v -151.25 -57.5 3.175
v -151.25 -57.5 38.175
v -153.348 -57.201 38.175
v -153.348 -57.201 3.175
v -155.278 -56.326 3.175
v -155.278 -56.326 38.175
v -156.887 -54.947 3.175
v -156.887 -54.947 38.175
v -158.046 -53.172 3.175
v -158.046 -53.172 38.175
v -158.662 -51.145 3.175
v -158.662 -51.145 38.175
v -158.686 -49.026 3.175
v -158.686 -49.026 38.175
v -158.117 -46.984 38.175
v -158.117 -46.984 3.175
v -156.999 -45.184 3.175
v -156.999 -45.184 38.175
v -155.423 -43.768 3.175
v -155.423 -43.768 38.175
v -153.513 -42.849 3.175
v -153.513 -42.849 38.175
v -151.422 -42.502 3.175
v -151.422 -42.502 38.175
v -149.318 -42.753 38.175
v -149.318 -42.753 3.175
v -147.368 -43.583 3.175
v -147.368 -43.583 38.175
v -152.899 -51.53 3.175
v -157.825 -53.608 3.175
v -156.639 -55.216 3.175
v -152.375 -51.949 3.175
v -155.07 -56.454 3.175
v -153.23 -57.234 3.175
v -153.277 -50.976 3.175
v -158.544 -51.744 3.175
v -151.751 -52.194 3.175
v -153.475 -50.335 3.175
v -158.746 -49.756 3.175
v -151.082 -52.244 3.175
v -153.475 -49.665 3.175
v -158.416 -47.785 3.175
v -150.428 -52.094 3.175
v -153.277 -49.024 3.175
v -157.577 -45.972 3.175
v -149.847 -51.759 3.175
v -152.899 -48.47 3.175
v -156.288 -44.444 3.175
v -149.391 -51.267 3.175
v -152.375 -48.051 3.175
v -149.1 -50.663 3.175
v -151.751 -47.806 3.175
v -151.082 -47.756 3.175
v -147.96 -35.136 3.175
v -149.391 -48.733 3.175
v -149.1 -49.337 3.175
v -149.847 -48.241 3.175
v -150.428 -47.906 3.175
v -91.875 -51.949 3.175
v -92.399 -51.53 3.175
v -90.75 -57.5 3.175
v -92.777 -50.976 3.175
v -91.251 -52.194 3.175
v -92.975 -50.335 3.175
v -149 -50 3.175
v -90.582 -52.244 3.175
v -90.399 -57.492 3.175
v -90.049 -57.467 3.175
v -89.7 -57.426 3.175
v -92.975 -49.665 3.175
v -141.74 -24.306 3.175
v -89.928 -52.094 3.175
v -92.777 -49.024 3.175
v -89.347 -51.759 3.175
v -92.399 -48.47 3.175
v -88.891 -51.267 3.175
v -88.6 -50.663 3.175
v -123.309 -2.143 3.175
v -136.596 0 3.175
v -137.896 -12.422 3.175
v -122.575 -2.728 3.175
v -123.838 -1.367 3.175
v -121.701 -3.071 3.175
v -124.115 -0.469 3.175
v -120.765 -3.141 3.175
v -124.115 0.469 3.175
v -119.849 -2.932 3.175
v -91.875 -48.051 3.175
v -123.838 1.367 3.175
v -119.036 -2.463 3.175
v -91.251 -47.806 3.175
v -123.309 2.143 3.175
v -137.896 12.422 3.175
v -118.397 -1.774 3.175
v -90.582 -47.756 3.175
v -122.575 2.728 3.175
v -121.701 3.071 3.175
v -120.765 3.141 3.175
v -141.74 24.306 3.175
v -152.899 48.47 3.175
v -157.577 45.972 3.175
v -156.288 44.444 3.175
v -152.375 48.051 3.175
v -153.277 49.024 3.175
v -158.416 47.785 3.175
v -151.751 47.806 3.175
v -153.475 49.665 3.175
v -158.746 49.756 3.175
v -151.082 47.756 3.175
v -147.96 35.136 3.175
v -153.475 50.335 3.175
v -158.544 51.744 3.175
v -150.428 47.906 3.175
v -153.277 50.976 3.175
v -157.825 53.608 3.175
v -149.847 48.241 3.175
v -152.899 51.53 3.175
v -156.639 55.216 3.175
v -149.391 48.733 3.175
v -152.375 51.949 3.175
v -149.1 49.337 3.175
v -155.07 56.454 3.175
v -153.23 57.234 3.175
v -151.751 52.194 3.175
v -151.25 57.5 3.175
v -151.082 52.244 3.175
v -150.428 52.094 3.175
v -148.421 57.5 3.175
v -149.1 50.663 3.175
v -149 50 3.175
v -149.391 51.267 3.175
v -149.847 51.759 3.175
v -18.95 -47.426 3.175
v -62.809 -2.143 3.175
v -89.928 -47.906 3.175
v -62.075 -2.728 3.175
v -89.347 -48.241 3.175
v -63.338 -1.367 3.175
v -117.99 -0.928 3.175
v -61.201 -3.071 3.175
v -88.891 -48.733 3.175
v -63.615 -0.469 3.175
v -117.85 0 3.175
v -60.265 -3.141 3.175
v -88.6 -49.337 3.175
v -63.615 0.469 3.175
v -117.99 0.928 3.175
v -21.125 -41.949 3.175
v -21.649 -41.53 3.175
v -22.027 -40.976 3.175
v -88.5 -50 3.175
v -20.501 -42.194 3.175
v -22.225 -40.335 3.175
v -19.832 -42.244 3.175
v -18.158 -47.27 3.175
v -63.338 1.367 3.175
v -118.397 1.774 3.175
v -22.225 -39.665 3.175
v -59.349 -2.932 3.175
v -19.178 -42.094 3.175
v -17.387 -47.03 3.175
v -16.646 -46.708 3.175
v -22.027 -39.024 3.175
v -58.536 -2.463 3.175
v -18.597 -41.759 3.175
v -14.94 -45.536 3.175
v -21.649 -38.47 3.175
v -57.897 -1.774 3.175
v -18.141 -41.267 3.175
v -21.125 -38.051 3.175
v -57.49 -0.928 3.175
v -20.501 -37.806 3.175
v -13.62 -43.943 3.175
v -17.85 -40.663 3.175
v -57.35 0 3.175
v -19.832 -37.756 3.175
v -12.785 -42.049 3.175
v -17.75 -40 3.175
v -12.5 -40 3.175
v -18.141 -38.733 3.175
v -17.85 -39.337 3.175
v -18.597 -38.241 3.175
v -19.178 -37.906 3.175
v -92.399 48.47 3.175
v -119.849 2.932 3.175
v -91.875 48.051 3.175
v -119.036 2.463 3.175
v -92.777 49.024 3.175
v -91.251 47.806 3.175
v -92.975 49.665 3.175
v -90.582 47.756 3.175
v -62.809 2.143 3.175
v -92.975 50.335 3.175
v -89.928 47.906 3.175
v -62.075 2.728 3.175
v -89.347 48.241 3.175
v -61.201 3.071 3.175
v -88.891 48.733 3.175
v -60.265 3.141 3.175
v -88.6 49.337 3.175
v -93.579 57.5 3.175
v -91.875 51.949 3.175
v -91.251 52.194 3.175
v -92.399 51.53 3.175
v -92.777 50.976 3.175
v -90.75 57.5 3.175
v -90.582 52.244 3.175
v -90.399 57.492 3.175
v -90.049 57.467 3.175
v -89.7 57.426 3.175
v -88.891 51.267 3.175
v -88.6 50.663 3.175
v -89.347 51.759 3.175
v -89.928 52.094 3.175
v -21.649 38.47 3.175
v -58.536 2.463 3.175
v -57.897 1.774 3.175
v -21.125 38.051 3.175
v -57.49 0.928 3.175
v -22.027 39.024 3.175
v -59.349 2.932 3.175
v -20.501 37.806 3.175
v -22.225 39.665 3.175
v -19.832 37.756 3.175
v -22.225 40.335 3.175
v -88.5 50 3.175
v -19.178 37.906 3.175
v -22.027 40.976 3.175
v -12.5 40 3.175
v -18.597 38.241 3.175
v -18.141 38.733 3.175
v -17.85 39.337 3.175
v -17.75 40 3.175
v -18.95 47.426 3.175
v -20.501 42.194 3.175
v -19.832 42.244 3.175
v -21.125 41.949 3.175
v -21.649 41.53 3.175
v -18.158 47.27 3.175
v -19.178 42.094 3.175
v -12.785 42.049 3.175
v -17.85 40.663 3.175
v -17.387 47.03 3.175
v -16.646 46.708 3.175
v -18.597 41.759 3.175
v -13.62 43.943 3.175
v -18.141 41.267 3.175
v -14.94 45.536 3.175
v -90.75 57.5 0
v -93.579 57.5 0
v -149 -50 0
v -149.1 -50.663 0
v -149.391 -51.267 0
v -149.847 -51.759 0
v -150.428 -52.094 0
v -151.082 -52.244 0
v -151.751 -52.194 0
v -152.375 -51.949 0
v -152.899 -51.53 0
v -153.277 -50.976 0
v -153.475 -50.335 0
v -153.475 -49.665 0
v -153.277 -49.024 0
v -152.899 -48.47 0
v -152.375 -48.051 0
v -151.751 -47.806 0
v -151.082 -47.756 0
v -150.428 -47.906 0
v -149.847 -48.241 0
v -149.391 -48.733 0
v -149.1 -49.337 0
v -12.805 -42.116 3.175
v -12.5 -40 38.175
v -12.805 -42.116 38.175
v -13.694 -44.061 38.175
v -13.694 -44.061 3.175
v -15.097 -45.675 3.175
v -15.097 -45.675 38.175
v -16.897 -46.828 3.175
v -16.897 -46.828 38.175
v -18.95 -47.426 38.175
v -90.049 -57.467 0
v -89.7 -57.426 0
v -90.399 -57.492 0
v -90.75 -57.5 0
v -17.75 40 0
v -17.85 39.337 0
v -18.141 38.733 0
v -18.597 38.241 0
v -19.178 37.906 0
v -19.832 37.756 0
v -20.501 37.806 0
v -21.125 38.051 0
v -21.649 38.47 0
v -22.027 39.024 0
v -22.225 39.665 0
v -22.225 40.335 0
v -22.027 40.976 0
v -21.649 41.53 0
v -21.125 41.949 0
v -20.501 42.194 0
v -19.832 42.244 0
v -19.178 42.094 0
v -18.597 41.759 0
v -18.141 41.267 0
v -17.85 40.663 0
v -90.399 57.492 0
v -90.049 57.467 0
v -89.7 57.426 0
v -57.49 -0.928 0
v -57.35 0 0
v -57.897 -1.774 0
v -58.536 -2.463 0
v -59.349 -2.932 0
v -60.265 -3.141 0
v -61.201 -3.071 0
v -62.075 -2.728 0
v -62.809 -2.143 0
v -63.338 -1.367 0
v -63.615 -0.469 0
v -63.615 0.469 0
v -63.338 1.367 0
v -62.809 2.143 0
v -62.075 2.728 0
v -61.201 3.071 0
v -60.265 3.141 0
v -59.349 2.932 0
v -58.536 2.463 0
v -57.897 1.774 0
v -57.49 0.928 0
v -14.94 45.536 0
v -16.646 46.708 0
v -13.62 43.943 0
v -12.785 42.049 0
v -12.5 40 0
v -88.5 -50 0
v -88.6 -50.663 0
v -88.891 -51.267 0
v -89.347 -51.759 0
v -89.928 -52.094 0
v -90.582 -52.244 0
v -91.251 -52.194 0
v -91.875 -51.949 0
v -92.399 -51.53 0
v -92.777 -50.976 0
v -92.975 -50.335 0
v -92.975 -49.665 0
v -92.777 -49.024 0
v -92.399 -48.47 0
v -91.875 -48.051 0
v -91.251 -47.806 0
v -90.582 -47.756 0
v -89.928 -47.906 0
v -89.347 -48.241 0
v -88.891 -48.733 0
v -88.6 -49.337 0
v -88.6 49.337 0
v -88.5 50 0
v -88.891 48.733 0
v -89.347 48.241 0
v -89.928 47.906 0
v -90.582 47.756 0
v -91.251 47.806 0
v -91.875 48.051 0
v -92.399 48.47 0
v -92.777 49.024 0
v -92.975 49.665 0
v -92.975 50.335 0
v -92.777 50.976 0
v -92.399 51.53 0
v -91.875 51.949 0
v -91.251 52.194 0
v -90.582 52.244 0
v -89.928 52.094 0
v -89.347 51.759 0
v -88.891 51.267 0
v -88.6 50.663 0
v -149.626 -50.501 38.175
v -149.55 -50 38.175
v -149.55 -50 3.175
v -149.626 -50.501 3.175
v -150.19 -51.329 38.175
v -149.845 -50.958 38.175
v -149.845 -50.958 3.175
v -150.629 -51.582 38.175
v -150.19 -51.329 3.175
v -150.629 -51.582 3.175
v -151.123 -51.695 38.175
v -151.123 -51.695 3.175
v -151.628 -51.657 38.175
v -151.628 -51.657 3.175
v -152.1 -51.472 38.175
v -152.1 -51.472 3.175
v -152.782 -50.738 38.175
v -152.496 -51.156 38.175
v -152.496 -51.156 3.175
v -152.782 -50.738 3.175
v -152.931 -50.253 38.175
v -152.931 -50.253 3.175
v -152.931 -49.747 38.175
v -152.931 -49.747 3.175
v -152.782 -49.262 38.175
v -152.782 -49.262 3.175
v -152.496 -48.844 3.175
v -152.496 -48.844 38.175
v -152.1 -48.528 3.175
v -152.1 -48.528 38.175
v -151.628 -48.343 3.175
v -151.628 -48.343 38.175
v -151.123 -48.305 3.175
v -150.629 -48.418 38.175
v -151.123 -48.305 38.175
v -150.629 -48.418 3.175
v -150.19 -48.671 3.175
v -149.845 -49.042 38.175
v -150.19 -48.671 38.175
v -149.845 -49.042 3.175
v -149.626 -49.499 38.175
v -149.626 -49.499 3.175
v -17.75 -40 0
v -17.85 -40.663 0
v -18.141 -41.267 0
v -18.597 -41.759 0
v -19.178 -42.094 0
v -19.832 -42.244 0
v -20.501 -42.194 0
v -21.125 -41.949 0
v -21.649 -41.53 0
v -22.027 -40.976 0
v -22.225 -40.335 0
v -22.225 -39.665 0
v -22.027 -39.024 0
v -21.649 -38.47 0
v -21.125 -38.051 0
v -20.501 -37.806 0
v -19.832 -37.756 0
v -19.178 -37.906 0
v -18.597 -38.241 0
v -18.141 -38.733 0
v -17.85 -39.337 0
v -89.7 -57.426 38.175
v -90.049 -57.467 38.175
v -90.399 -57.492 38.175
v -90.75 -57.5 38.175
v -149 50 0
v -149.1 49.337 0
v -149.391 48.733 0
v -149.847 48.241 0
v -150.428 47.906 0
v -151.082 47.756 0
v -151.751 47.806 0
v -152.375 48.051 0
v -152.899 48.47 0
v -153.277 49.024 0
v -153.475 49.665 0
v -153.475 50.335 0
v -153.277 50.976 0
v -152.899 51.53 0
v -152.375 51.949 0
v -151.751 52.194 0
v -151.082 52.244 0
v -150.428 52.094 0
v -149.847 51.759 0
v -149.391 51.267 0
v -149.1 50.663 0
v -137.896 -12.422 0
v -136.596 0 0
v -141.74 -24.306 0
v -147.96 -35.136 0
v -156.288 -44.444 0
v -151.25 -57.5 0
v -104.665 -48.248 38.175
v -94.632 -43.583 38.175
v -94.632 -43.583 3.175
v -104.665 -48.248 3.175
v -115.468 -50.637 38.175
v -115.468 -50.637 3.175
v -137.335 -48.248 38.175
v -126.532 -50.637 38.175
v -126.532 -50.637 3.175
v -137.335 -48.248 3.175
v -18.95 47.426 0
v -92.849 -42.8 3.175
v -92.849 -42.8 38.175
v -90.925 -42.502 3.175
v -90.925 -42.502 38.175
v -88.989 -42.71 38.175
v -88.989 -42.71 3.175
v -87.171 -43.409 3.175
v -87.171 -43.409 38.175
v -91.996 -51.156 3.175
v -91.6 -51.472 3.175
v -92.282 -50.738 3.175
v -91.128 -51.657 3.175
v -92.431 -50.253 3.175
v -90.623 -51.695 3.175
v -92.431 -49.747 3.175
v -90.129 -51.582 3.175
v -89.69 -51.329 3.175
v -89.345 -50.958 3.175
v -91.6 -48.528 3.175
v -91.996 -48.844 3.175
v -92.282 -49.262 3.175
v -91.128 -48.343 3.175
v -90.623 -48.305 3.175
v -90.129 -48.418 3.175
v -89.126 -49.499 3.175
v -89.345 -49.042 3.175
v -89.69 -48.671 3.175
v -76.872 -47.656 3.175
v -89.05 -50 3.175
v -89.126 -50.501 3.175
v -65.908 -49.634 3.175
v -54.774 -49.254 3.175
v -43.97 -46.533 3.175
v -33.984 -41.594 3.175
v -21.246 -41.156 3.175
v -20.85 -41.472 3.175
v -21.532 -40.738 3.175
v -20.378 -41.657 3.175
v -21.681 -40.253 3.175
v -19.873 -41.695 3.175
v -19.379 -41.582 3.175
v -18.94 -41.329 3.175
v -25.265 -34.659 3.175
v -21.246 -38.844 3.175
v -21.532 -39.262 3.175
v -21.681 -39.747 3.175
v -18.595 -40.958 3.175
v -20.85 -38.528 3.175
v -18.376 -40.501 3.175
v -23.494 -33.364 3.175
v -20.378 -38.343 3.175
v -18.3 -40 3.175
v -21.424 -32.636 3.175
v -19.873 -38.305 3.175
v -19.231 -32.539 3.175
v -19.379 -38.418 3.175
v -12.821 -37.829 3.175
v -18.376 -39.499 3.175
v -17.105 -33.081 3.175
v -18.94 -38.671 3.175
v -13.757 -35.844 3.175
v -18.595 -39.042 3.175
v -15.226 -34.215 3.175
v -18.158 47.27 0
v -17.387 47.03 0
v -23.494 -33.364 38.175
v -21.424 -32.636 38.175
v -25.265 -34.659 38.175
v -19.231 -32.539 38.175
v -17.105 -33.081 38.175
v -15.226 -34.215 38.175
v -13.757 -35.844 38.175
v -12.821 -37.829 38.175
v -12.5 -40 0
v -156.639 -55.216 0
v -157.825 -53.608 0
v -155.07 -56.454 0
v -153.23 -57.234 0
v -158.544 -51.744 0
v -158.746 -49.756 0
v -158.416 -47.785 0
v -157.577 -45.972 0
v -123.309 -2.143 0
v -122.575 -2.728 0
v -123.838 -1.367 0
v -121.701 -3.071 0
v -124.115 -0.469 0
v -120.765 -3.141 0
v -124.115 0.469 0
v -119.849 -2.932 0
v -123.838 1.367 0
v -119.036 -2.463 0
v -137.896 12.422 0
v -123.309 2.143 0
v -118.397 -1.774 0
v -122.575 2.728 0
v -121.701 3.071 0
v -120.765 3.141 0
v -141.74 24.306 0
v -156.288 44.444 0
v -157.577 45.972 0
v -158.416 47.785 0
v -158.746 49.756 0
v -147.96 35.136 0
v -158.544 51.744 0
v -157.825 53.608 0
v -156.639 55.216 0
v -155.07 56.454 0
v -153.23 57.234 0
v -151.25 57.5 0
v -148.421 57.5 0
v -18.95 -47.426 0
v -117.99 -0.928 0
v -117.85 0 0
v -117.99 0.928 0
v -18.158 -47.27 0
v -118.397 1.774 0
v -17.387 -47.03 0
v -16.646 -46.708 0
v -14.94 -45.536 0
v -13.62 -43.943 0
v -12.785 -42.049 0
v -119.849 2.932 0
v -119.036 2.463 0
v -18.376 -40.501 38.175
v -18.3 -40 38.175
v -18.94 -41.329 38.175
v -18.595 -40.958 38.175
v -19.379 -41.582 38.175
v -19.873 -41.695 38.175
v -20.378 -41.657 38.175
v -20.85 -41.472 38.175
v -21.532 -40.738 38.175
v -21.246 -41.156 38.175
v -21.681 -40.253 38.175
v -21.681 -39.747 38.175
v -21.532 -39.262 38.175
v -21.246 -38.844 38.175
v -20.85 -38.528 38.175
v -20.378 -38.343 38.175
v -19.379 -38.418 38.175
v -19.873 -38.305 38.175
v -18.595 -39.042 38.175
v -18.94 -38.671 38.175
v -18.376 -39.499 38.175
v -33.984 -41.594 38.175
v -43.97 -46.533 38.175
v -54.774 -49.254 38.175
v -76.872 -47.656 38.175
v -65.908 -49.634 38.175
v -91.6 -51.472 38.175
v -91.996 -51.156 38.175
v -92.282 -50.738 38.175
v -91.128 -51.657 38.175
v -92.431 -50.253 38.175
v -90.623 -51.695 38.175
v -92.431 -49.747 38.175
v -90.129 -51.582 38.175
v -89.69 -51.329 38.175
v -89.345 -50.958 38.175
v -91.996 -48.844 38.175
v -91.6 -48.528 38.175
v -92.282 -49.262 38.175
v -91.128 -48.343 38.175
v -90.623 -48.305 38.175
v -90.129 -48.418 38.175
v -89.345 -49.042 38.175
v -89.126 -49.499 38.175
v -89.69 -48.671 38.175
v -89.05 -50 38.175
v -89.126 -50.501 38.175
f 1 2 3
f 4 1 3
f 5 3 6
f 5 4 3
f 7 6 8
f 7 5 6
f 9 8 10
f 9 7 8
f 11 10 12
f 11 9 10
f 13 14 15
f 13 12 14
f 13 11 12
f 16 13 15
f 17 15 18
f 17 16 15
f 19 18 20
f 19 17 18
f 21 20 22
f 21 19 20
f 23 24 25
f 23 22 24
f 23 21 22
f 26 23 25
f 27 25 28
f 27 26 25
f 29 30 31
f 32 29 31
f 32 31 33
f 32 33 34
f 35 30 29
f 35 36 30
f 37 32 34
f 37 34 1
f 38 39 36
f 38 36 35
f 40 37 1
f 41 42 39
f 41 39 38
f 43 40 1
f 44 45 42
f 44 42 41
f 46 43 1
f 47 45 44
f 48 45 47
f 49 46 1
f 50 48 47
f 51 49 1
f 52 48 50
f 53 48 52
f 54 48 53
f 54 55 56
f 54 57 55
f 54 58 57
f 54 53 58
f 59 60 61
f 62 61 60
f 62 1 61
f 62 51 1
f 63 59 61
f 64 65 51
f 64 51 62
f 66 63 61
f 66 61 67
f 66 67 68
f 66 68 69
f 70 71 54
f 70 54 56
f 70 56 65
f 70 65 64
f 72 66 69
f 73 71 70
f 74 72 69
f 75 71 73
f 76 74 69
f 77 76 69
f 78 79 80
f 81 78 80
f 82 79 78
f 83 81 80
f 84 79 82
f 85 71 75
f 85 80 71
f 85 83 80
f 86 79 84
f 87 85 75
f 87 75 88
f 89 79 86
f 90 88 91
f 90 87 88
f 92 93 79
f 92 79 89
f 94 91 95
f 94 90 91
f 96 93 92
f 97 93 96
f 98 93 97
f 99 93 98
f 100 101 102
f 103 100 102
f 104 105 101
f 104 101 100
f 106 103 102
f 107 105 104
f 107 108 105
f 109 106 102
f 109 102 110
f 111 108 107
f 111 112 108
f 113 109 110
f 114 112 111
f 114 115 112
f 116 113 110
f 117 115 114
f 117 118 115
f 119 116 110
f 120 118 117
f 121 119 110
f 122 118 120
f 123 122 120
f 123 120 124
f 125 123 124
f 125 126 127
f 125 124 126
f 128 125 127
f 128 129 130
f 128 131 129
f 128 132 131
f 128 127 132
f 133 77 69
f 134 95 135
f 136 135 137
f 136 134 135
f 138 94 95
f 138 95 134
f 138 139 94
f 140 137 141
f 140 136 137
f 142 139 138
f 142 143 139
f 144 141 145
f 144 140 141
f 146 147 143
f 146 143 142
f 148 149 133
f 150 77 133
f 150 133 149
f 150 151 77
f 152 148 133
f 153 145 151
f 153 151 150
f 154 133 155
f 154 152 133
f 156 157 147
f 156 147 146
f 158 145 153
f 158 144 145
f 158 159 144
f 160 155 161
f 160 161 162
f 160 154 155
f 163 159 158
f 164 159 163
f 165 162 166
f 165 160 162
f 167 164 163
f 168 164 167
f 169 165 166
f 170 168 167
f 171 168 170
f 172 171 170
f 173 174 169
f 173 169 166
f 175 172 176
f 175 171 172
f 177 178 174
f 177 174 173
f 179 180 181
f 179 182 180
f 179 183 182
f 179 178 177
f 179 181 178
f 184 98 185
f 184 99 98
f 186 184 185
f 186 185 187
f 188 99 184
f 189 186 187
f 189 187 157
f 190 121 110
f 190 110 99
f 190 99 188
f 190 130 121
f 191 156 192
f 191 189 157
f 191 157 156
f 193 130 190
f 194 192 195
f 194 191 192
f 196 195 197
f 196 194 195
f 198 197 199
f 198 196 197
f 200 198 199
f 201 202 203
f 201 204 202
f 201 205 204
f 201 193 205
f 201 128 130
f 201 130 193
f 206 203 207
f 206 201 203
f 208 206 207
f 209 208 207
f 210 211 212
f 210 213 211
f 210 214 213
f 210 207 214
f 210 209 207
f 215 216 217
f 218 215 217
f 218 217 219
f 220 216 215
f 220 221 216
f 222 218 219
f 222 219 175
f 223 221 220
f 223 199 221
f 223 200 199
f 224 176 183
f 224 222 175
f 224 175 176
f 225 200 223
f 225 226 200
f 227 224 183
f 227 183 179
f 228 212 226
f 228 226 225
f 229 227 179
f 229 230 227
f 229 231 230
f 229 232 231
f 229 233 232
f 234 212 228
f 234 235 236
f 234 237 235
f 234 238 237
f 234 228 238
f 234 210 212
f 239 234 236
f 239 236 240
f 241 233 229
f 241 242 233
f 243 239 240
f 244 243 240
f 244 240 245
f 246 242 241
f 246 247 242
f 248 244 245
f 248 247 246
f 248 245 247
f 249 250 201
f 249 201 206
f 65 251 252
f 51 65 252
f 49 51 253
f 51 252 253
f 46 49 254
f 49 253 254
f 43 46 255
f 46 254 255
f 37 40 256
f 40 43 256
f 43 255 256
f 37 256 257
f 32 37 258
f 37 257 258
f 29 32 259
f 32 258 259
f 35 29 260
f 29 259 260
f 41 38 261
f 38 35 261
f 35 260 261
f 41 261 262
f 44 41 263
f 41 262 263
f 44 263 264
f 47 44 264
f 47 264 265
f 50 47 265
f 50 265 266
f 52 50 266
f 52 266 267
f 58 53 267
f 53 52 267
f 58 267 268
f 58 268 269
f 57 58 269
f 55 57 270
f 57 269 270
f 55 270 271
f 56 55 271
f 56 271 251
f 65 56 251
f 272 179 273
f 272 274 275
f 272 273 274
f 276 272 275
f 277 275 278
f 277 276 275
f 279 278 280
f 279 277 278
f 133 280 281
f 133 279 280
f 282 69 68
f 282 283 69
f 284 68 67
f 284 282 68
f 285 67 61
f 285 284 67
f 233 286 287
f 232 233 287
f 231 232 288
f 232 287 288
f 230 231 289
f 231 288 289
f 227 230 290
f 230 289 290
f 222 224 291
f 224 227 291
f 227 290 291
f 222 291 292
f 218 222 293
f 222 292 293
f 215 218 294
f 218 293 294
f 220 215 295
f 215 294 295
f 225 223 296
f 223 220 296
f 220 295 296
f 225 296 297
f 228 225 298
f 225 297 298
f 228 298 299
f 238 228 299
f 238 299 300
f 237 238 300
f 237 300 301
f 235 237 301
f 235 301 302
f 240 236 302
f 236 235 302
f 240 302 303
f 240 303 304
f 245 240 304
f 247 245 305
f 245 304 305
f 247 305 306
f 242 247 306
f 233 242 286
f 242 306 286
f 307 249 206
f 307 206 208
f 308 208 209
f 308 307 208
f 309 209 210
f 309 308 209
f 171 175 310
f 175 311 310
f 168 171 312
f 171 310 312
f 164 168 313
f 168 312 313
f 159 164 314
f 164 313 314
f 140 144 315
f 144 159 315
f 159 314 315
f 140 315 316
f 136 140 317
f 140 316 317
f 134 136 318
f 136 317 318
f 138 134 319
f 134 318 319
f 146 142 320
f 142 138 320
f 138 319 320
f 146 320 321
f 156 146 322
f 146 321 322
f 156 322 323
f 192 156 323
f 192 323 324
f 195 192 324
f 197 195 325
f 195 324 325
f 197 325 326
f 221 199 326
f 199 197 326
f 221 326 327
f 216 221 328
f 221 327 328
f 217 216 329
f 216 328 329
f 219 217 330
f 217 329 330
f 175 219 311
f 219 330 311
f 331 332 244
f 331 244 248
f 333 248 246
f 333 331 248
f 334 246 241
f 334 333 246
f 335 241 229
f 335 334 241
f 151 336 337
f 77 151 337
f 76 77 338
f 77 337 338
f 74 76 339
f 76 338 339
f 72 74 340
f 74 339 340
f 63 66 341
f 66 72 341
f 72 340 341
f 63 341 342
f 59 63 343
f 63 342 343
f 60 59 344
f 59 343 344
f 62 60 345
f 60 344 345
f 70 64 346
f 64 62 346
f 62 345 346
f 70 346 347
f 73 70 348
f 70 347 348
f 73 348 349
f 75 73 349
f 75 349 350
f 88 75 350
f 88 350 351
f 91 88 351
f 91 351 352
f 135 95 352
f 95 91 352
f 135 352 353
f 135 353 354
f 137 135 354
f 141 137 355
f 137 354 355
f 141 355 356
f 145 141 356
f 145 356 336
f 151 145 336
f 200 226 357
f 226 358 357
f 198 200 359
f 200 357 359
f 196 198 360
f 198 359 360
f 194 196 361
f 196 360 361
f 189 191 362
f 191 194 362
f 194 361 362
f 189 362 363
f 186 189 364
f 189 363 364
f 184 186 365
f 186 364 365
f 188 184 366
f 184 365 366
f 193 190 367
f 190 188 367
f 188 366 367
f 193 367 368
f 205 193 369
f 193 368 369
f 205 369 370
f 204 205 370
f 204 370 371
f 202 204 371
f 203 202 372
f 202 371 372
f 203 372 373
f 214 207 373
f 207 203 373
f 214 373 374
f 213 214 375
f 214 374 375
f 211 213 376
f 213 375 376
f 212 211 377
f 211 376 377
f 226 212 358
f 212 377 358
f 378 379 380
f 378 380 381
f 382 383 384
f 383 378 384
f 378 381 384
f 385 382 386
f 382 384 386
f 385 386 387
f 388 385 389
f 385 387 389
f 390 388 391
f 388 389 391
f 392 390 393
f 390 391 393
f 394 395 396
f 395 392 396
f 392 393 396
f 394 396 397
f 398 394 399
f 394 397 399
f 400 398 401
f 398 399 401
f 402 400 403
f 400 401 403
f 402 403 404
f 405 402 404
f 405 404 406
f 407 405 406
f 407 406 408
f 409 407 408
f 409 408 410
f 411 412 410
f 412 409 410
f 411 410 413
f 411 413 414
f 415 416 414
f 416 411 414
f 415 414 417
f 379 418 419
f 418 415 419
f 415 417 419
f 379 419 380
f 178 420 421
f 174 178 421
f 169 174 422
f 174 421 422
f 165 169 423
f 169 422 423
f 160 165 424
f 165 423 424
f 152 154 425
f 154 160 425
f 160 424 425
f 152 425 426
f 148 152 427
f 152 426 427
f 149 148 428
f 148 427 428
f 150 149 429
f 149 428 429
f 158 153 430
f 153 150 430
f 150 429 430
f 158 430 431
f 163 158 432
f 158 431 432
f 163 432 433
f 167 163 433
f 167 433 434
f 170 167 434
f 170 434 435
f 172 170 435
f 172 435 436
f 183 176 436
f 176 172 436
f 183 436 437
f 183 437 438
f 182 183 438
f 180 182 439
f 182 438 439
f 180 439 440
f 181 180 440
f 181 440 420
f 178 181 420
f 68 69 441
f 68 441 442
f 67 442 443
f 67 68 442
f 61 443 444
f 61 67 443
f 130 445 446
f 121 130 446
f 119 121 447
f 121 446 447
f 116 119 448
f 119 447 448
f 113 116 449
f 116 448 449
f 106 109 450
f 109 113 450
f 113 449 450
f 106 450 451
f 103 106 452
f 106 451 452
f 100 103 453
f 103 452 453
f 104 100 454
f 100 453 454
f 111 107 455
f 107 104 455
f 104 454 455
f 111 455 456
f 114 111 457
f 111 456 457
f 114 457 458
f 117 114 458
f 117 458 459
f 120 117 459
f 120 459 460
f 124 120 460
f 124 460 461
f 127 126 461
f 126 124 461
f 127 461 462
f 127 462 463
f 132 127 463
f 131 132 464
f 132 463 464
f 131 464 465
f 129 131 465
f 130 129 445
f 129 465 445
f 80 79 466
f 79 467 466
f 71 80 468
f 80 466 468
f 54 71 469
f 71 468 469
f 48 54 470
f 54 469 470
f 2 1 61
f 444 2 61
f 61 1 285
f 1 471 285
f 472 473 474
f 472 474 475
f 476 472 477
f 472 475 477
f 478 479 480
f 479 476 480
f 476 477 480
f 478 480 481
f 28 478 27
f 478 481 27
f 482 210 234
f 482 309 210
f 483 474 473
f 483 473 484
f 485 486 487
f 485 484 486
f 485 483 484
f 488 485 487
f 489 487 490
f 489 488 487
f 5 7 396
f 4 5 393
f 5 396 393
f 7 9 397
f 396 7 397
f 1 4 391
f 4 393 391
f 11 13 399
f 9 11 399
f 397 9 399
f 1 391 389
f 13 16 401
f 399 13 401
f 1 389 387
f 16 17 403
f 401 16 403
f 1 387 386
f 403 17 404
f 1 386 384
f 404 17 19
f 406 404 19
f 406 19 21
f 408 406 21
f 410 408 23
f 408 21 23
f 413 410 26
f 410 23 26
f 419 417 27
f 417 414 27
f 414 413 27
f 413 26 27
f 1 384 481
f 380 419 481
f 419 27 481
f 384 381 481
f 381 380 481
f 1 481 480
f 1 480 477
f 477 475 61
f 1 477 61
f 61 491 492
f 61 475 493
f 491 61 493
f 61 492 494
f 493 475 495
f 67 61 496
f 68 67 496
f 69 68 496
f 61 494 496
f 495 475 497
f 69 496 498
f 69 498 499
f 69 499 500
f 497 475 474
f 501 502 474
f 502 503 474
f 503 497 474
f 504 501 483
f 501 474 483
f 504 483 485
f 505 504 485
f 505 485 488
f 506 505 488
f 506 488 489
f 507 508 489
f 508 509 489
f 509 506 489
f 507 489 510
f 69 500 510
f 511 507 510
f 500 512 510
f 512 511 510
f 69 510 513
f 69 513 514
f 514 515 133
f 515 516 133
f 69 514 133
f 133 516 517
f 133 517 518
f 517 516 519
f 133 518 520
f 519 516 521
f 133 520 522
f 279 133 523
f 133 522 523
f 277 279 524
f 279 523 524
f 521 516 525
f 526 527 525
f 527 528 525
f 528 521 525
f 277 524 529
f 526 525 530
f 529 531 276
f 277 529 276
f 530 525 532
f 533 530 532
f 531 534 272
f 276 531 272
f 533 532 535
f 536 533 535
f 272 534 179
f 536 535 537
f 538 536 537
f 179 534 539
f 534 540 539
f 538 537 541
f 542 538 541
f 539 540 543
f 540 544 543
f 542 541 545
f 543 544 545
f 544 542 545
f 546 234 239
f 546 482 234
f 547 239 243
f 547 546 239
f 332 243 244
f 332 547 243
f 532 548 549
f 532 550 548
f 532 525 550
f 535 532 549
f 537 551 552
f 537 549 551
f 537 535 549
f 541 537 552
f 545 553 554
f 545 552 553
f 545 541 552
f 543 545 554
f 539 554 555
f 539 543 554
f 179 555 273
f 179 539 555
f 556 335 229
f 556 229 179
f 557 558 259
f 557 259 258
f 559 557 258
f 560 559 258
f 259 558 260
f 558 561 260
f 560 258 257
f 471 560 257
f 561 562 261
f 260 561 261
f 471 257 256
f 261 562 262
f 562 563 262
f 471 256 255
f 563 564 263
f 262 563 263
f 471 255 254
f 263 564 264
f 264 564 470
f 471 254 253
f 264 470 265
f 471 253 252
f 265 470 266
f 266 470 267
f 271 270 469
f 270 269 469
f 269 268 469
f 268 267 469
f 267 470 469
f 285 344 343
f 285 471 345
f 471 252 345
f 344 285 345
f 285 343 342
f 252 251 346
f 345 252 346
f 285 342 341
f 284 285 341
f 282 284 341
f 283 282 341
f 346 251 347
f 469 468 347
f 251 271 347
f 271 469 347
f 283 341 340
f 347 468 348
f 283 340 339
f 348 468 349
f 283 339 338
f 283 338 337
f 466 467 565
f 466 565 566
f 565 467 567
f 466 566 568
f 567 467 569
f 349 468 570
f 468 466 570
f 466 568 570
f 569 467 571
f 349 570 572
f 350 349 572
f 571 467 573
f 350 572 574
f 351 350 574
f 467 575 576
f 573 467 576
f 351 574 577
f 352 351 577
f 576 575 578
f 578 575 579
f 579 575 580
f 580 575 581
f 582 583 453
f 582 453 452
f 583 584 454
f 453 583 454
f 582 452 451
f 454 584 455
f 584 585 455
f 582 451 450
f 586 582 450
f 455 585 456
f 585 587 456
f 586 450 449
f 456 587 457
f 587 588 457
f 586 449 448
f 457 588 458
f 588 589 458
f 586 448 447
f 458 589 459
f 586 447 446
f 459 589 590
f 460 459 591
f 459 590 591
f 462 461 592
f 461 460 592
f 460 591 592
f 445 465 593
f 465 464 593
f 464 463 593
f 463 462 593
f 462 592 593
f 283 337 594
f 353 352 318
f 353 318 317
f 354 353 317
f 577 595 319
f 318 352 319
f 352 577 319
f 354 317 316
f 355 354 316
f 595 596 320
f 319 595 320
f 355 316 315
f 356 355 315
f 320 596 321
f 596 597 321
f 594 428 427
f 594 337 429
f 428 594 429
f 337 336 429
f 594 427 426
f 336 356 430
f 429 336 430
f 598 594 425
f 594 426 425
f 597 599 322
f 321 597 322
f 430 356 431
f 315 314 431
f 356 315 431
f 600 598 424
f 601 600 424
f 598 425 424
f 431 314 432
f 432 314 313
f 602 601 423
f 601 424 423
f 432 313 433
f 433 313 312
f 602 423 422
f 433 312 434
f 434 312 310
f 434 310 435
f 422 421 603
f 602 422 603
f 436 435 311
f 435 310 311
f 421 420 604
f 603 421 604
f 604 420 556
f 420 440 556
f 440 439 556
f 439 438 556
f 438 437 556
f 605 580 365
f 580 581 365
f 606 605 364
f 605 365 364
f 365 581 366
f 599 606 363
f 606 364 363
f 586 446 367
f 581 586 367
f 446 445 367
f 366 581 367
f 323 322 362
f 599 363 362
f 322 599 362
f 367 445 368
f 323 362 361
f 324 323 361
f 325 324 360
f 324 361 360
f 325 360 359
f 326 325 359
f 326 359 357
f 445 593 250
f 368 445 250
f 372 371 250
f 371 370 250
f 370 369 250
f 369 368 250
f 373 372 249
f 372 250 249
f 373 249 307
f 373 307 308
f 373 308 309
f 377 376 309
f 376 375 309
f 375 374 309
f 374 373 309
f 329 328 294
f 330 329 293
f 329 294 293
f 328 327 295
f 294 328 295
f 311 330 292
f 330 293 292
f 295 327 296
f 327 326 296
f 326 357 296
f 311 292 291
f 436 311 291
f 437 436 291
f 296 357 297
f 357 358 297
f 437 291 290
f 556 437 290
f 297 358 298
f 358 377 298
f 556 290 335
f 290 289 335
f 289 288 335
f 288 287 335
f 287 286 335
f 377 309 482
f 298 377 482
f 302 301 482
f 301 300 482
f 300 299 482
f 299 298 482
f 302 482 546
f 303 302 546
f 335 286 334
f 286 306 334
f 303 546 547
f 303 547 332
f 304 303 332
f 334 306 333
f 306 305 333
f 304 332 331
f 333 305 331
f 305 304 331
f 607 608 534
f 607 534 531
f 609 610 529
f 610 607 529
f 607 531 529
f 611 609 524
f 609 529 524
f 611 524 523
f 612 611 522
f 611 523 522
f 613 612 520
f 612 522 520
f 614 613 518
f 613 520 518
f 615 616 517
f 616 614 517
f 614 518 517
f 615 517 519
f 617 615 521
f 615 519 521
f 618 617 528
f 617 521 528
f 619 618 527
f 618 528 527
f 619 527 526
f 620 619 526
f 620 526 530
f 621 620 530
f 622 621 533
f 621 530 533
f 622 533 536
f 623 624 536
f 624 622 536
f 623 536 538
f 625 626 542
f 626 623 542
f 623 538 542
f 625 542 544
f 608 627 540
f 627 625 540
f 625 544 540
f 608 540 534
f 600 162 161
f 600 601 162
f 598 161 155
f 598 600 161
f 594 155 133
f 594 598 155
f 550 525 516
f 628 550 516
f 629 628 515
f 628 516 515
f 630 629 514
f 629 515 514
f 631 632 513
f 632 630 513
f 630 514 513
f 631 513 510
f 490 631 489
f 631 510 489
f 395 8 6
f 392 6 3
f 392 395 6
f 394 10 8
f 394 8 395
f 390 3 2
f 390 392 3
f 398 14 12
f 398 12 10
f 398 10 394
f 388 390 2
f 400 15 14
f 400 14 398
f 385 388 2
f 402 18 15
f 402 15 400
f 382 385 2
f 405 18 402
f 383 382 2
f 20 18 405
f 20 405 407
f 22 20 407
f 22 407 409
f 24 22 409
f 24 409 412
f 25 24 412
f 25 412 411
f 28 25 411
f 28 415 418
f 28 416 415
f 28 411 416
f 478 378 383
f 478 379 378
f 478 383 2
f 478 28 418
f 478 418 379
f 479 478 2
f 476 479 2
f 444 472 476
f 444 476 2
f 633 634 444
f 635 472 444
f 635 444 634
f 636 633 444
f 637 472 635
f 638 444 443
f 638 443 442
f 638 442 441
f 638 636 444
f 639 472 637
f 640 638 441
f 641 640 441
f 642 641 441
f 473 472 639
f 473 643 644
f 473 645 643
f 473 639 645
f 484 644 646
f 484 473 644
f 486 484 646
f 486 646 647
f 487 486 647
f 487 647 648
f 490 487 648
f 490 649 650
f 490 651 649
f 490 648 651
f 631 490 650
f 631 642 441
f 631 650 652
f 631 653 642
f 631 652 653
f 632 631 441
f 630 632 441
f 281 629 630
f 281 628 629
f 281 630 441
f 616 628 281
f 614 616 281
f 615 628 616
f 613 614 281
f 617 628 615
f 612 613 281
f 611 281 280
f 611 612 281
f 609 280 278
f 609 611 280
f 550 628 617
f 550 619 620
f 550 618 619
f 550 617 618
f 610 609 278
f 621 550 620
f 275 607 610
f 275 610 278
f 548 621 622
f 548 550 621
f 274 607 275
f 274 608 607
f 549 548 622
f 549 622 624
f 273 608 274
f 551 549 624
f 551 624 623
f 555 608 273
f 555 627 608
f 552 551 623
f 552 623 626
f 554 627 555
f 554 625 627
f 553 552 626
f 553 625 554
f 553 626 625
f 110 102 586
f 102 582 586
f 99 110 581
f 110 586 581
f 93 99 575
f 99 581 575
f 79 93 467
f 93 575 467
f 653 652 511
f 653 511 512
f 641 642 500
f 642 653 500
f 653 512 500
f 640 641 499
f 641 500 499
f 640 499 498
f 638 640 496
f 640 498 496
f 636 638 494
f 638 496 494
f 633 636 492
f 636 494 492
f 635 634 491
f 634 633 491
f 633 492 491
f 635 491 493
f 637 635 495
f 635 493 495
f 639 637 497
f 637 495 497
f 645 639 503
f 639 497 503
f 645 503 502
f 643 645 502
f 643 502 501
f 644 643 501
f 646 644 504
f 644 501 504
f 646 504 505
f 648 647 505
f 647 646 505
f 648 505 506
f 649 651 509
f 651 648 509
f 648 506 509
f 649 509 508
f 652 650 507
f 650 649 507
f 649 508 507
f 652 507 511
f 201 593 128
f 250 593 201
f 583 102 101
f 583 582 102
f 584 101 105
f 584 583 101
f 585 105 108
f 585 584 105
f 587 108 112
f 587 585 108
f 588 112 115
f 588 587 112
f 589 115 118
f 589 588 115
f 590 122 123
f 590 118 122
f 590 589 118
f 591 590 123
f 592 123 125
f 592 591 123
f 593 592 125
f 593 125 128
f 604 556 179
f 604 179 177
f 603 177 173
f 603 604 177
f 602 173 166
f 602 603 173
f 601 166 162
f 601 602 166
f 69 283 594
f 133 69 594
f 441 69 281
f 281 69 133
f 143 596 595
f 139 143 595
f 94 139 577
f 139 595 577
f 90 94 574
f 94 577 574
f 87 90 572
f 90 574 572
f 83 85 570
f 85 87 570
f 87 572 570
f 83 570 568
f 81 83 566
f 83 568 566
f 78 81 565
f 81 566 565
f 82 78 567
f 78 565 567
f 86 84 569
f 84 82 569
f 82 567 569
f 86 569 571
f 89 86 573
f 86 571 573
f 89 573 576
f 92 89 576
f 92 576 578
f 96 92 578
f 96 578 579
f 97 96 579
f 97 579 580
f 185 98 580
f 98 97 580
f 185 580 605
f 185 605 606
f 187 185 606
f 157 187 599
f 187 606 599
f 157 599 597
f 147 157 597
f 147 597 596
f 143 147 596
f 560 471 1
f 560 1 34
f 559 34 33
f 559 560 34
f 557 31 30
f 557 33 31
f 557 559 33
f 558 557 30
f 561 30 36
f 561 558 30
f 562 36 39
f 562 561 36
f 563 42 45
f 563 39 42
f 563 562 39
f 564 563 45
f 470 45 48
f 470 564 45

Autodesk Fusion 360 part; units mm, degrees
sketch "Sketch1" plane through (0, 0, 0) normal (0, 0, 1) x (1, 0, 0)
  circle A0 centre (0, 0) radius 5
  line L0 (0, 0) -> (-60.5, 0) construction
  line L1 (-60.5, 0) -> (-121, 0) construction
  circle A1 centre (-60.5, 0) radius 3.15
  circle A2 centre (-121, 0) radius 3.15
  circle A3 centre (-60.5, 0) radius 47 construction
  circle A4 centre (-121, 0) radius 47 construction
  circle A5 centre (0, 0) radius 17.5 construction
  circle A6 centre (-60.5, 0) radius 17 construction
  circle A7 centre (0, 0) radius 12.5 construction
  circle A8 centre (0, 30) radius 2.25
  circle A9 centre (0, -30) radius 2.25
  circle A10 centre (0, 30) radius 6 construction
  circle A11 centre (0, -30) radius 6 construction
  line L2 (-90.75, 0) -> (-90.75, 50) construction
  circle A12 centre (-90.75, 50) radius 7.5
  circle A13 centre (-90.75, 50) radius 2.25
  line L3 (-90.75, 0) -> (-90.75, -50) construction
  circle A14 centre (-90.75, -50) radius 7.5
  circle A15 centre (-90.75, -50) radius 2.25
  line L4 (-121, 0) -> (-151.25, 0) construction
  line L5 (-151.25, 0) -> (-151.25, 50) construction
  circle A16 centre (-151.25, 50) radius 7.5
  circle A17 centre (-151.25, 50) radius 2.25
  line L6 (-151.25, 0) -> (-151.25, -50) construction
  circle A18 centre (-151.25, -50) radius 7.5
  circle A19 centre (-151.25, -50) radius 2.25
  circle A20 centre (-20, 40) radius 7.5
  line L7 (-20, 40) -> (-20, 0) construction
  line L8 (-20, 0) -> (-20, -40) construction
  circle A21 centre (-20, -40) radius 7.5
  circle A22 centre (-20, -40) radius 2.25
  circle A23 centre (-20, 40) radius 2.25
  line L9 (-89.7004, -57.4262) -> (-18.9504, -47.4262)
  circle A24 centre (0, -30) radius 7.5
  circle A25 centre (0, 30) radius 7.5
  line L10 (-89.7004, 57.4262) -> (-18.9504, 47.4262)
  circle A26 centre (-196.5959, 0) radius 60
  line L11 (-16.6459, 46.7082) -> (3.3541, 36.7082)
  line L12 (7.0711, 32.5) -> (16.4992, 5.8333)
  line L13 (7.0711, -32.5) -> (16.4992, -5.8333)
  line L14 (-16.6459, -46.7082) -> (3.3541, -36.7082)
  circle A27 centre (-121, 86.6222) radius 40
  line L15 (-151.25, -57.5) -> (-90.75, -57.5)
  line L16 (-160.1233, -61.9813) -> (16.4992, -61.9813) construction
  line L17 (-12.5, 40) -> (-12.5, -40)
  line L18 (-151.25, 57.5) -> (-90.75, 57.5)
  dimension "d1" = 10
  dimension "d2" = 60.5
  dimension "d4" = 60.5
  dimension "d6" = 6.3
  dimension "d7" = 6.3
  dimension "d8" = 94
  dimension "d9" = 94
  dimension "d10" = 35
  dimension "d11" = 34
  dimension "d12" = 25
  dimension "d13" = 4.5
  dimension "d14" = 4.5
  dimension "d15" = 60
  dimension "d16" = 12
  dimension "d17" = 12
  dimension "d18" = 15
  dimension "d19" = 50
  dimension "d20" = 4.5
  dimension "d21" = 15
  dimension "d22" = 4.5
  dimension "d23" = 30.25
  dimension "d24" = 15
  dimension "d25" = 4.5
  dimension "d26" = 15
  dimension "d27" = 4.5
  dimension "d28" = 15
  dimension "d29" = 40
  dimension "d30" = 20
  dimension "d31" = 15
  dimension "d32" = 4.5
  dimension "d33" = 4.5
  dimension "d34" = 15
  dimension "d35" = 15
  dimension "d36" = 120
  dimension "d37" = 80
extrude "Extrude1" add sketch "Sketch1" along normal blind 3.175 contours A12 | A12 A14 A16 A18 A20 A21 L9 L10 A26 A27 L15 L17 | A12 A27 L18 | A27 L18 | A20 | A16 | A16 A27 L18 | A21 | A18 | A14 picked at (-127.9955, 54.7116) makes body 1
ref_plane "WorkPlane1" through (-86.2997, 0, 3.175) normal (0, 0, 1) x (1, 0, 0)
sketch "Sketch2" plane through (0, 0, 3.175) normal (0, 0, 1) x (1, 0, 0)
  circle A0 centre (-90.75, -50) radius 2.25
  circle A1 centre (-90.75, 50) radius 2.25
  circle A2 centre (-151.25, 50) radius 2.25
  circle A3 centre (-20, 40) radius 2.25
  circle A4 centre (-20, -40) radius 2.25
  circle A5 centre (-60.5, 0) radius 3.15
  circle A6 centre (-121, 0) radius 3.15
  circle A7 centre (-151.25, -50) radius 2.25
  line L0 (-151.25, -57.5) -> (-90.75, -57.5)
  arc A8 (-156.2884, -44.4444) -> (-151.25, -57.5) centre (-151.25, -50) ccw
  arc A9 (-156.2884, -44.4444) -> (-156.2884, 44.4444) centre (-196.5959, 0) ccw
  arc A10 (-151.25, 57.5) -> (-156.2884, 44.4444) centre (-151.25, 50) ccw
  line L1 (-151.25, 57.5) -> (-90.75, 57.5)
  arc A11 (-89.7004, 57.4262) -> (-90.75, 57.5) centre (-90.75, 50) ccw
  line L2 (-89.7004, 57.4262) -> (-18.9504, 47.4262)
  arc A12 (-12.5, 40) -> (-18.9504, 47.4262) centre (-20, 40) ccw
  line L3 (-12.5, 40) -> (-12.5, -40)
  arc A13 (-18.9504, -47.4262) -> (-12.5, -40) centre (-20, -40) ccw
  line L4 (-89.7004, -57.4262) -> (-18.9504, -47.4262)
  arc A14 (-90.75, -57.5) -> (-89.7004, -57.4262) centre (-90.75, -50) ccw
ref_plane "WorkPlane2" through (-86.2997, 0, 3.175) normal (0, 0, 1) x (1, 0, 0)
sketch "Sketch3" plane through (0, 0, 3.175) normal (0, 0, 1) x (1, 0, 0)
  circle A0 centre (-121, 0) radius 47 construction
  circle A1 centre (-60.5, 0) radius 47 construction
  circle A2 centre (-151.25, -50) radius 7.5
  circle A3 centre (-151.25, -50) radius 1.7
  circle A4 centre (-90.75, -50) radius 7.5
  circle A5 centre (-90.75, -50) radius 1.7
  circle A6 centre (-20, -40) radius 7.5
  circle A7 centre (-20, -40) radius 1.7
  circle A8 centre (-121, 0) radius 50.9385
  circle A9 centre (-62.1212, 2.7294) radius 52.5
  line L0 (-151.25, -57.5) -> (-90.75, -57.5)
  line L1 (-89.7004, -57.4262) -> (-18.9504, -47.4262)
  point P0 (-151.25, -50)
  point P1 (-90.75, -50)
  point P2 (-20, -40)
  dimension "d46" = 15
  dimension "d48" = 3.4
  dimension "d49" = 15
  dimension "d50" = 3.4
  dimension "d51" = 15
  dimension "d52" = 3.4
  dimension "d54" = 105
extrude "Extrude2" add sketch "Sketch3" along normal blind 35 separate body contours A2 | A2 A4 A8 L0 | A4 | A4 A6 A9 L1 | A6 makes body 2
copy_body "Body->Comp1" bodies 2 removing the originals makes body 3 in component "Component"
component "Component" placed x (1, 0, 0) y (0, 1, 0) z (0, 0, 1) at (0, 0, 0)
equation "d2 = distBetweenGears"
equation "distBetweenGears = 60.5 mm"
equation "d4 = distBetweenGears"
equation "acrylicRoundHoleSize = 6.3 mm"
equation "d6 = acrylicRoundHoleSize"
equation "d7 = acrylicRoundHoleSize"
equation "d13 = WoodScrewHoleSize"
equation "d14 = WoodScrewHoleSize"
equation "d20 = WoodScrewHoleSize"
equation "d22 = WoodScrewHoleSize"
equation "d23 = distBetweenGears / 2"
equation "d25 = WoodScrewHoleSize"
equation "d27 = WoodScrewHoleSize"
equation "d32 = WoodScrewHoleSize"
equation "d33 = WoodScrewHoleSize"
equation "WoodScrewHoleSize = 4.5 mm"
equation "PrintScrewHoleSize = 3.4 mm"
equation "d48 = PrintScrewHoleSize"
equation "d50 = PrintScrewHoleSize"
equation "d52 = PrintScrewHoleSize"
